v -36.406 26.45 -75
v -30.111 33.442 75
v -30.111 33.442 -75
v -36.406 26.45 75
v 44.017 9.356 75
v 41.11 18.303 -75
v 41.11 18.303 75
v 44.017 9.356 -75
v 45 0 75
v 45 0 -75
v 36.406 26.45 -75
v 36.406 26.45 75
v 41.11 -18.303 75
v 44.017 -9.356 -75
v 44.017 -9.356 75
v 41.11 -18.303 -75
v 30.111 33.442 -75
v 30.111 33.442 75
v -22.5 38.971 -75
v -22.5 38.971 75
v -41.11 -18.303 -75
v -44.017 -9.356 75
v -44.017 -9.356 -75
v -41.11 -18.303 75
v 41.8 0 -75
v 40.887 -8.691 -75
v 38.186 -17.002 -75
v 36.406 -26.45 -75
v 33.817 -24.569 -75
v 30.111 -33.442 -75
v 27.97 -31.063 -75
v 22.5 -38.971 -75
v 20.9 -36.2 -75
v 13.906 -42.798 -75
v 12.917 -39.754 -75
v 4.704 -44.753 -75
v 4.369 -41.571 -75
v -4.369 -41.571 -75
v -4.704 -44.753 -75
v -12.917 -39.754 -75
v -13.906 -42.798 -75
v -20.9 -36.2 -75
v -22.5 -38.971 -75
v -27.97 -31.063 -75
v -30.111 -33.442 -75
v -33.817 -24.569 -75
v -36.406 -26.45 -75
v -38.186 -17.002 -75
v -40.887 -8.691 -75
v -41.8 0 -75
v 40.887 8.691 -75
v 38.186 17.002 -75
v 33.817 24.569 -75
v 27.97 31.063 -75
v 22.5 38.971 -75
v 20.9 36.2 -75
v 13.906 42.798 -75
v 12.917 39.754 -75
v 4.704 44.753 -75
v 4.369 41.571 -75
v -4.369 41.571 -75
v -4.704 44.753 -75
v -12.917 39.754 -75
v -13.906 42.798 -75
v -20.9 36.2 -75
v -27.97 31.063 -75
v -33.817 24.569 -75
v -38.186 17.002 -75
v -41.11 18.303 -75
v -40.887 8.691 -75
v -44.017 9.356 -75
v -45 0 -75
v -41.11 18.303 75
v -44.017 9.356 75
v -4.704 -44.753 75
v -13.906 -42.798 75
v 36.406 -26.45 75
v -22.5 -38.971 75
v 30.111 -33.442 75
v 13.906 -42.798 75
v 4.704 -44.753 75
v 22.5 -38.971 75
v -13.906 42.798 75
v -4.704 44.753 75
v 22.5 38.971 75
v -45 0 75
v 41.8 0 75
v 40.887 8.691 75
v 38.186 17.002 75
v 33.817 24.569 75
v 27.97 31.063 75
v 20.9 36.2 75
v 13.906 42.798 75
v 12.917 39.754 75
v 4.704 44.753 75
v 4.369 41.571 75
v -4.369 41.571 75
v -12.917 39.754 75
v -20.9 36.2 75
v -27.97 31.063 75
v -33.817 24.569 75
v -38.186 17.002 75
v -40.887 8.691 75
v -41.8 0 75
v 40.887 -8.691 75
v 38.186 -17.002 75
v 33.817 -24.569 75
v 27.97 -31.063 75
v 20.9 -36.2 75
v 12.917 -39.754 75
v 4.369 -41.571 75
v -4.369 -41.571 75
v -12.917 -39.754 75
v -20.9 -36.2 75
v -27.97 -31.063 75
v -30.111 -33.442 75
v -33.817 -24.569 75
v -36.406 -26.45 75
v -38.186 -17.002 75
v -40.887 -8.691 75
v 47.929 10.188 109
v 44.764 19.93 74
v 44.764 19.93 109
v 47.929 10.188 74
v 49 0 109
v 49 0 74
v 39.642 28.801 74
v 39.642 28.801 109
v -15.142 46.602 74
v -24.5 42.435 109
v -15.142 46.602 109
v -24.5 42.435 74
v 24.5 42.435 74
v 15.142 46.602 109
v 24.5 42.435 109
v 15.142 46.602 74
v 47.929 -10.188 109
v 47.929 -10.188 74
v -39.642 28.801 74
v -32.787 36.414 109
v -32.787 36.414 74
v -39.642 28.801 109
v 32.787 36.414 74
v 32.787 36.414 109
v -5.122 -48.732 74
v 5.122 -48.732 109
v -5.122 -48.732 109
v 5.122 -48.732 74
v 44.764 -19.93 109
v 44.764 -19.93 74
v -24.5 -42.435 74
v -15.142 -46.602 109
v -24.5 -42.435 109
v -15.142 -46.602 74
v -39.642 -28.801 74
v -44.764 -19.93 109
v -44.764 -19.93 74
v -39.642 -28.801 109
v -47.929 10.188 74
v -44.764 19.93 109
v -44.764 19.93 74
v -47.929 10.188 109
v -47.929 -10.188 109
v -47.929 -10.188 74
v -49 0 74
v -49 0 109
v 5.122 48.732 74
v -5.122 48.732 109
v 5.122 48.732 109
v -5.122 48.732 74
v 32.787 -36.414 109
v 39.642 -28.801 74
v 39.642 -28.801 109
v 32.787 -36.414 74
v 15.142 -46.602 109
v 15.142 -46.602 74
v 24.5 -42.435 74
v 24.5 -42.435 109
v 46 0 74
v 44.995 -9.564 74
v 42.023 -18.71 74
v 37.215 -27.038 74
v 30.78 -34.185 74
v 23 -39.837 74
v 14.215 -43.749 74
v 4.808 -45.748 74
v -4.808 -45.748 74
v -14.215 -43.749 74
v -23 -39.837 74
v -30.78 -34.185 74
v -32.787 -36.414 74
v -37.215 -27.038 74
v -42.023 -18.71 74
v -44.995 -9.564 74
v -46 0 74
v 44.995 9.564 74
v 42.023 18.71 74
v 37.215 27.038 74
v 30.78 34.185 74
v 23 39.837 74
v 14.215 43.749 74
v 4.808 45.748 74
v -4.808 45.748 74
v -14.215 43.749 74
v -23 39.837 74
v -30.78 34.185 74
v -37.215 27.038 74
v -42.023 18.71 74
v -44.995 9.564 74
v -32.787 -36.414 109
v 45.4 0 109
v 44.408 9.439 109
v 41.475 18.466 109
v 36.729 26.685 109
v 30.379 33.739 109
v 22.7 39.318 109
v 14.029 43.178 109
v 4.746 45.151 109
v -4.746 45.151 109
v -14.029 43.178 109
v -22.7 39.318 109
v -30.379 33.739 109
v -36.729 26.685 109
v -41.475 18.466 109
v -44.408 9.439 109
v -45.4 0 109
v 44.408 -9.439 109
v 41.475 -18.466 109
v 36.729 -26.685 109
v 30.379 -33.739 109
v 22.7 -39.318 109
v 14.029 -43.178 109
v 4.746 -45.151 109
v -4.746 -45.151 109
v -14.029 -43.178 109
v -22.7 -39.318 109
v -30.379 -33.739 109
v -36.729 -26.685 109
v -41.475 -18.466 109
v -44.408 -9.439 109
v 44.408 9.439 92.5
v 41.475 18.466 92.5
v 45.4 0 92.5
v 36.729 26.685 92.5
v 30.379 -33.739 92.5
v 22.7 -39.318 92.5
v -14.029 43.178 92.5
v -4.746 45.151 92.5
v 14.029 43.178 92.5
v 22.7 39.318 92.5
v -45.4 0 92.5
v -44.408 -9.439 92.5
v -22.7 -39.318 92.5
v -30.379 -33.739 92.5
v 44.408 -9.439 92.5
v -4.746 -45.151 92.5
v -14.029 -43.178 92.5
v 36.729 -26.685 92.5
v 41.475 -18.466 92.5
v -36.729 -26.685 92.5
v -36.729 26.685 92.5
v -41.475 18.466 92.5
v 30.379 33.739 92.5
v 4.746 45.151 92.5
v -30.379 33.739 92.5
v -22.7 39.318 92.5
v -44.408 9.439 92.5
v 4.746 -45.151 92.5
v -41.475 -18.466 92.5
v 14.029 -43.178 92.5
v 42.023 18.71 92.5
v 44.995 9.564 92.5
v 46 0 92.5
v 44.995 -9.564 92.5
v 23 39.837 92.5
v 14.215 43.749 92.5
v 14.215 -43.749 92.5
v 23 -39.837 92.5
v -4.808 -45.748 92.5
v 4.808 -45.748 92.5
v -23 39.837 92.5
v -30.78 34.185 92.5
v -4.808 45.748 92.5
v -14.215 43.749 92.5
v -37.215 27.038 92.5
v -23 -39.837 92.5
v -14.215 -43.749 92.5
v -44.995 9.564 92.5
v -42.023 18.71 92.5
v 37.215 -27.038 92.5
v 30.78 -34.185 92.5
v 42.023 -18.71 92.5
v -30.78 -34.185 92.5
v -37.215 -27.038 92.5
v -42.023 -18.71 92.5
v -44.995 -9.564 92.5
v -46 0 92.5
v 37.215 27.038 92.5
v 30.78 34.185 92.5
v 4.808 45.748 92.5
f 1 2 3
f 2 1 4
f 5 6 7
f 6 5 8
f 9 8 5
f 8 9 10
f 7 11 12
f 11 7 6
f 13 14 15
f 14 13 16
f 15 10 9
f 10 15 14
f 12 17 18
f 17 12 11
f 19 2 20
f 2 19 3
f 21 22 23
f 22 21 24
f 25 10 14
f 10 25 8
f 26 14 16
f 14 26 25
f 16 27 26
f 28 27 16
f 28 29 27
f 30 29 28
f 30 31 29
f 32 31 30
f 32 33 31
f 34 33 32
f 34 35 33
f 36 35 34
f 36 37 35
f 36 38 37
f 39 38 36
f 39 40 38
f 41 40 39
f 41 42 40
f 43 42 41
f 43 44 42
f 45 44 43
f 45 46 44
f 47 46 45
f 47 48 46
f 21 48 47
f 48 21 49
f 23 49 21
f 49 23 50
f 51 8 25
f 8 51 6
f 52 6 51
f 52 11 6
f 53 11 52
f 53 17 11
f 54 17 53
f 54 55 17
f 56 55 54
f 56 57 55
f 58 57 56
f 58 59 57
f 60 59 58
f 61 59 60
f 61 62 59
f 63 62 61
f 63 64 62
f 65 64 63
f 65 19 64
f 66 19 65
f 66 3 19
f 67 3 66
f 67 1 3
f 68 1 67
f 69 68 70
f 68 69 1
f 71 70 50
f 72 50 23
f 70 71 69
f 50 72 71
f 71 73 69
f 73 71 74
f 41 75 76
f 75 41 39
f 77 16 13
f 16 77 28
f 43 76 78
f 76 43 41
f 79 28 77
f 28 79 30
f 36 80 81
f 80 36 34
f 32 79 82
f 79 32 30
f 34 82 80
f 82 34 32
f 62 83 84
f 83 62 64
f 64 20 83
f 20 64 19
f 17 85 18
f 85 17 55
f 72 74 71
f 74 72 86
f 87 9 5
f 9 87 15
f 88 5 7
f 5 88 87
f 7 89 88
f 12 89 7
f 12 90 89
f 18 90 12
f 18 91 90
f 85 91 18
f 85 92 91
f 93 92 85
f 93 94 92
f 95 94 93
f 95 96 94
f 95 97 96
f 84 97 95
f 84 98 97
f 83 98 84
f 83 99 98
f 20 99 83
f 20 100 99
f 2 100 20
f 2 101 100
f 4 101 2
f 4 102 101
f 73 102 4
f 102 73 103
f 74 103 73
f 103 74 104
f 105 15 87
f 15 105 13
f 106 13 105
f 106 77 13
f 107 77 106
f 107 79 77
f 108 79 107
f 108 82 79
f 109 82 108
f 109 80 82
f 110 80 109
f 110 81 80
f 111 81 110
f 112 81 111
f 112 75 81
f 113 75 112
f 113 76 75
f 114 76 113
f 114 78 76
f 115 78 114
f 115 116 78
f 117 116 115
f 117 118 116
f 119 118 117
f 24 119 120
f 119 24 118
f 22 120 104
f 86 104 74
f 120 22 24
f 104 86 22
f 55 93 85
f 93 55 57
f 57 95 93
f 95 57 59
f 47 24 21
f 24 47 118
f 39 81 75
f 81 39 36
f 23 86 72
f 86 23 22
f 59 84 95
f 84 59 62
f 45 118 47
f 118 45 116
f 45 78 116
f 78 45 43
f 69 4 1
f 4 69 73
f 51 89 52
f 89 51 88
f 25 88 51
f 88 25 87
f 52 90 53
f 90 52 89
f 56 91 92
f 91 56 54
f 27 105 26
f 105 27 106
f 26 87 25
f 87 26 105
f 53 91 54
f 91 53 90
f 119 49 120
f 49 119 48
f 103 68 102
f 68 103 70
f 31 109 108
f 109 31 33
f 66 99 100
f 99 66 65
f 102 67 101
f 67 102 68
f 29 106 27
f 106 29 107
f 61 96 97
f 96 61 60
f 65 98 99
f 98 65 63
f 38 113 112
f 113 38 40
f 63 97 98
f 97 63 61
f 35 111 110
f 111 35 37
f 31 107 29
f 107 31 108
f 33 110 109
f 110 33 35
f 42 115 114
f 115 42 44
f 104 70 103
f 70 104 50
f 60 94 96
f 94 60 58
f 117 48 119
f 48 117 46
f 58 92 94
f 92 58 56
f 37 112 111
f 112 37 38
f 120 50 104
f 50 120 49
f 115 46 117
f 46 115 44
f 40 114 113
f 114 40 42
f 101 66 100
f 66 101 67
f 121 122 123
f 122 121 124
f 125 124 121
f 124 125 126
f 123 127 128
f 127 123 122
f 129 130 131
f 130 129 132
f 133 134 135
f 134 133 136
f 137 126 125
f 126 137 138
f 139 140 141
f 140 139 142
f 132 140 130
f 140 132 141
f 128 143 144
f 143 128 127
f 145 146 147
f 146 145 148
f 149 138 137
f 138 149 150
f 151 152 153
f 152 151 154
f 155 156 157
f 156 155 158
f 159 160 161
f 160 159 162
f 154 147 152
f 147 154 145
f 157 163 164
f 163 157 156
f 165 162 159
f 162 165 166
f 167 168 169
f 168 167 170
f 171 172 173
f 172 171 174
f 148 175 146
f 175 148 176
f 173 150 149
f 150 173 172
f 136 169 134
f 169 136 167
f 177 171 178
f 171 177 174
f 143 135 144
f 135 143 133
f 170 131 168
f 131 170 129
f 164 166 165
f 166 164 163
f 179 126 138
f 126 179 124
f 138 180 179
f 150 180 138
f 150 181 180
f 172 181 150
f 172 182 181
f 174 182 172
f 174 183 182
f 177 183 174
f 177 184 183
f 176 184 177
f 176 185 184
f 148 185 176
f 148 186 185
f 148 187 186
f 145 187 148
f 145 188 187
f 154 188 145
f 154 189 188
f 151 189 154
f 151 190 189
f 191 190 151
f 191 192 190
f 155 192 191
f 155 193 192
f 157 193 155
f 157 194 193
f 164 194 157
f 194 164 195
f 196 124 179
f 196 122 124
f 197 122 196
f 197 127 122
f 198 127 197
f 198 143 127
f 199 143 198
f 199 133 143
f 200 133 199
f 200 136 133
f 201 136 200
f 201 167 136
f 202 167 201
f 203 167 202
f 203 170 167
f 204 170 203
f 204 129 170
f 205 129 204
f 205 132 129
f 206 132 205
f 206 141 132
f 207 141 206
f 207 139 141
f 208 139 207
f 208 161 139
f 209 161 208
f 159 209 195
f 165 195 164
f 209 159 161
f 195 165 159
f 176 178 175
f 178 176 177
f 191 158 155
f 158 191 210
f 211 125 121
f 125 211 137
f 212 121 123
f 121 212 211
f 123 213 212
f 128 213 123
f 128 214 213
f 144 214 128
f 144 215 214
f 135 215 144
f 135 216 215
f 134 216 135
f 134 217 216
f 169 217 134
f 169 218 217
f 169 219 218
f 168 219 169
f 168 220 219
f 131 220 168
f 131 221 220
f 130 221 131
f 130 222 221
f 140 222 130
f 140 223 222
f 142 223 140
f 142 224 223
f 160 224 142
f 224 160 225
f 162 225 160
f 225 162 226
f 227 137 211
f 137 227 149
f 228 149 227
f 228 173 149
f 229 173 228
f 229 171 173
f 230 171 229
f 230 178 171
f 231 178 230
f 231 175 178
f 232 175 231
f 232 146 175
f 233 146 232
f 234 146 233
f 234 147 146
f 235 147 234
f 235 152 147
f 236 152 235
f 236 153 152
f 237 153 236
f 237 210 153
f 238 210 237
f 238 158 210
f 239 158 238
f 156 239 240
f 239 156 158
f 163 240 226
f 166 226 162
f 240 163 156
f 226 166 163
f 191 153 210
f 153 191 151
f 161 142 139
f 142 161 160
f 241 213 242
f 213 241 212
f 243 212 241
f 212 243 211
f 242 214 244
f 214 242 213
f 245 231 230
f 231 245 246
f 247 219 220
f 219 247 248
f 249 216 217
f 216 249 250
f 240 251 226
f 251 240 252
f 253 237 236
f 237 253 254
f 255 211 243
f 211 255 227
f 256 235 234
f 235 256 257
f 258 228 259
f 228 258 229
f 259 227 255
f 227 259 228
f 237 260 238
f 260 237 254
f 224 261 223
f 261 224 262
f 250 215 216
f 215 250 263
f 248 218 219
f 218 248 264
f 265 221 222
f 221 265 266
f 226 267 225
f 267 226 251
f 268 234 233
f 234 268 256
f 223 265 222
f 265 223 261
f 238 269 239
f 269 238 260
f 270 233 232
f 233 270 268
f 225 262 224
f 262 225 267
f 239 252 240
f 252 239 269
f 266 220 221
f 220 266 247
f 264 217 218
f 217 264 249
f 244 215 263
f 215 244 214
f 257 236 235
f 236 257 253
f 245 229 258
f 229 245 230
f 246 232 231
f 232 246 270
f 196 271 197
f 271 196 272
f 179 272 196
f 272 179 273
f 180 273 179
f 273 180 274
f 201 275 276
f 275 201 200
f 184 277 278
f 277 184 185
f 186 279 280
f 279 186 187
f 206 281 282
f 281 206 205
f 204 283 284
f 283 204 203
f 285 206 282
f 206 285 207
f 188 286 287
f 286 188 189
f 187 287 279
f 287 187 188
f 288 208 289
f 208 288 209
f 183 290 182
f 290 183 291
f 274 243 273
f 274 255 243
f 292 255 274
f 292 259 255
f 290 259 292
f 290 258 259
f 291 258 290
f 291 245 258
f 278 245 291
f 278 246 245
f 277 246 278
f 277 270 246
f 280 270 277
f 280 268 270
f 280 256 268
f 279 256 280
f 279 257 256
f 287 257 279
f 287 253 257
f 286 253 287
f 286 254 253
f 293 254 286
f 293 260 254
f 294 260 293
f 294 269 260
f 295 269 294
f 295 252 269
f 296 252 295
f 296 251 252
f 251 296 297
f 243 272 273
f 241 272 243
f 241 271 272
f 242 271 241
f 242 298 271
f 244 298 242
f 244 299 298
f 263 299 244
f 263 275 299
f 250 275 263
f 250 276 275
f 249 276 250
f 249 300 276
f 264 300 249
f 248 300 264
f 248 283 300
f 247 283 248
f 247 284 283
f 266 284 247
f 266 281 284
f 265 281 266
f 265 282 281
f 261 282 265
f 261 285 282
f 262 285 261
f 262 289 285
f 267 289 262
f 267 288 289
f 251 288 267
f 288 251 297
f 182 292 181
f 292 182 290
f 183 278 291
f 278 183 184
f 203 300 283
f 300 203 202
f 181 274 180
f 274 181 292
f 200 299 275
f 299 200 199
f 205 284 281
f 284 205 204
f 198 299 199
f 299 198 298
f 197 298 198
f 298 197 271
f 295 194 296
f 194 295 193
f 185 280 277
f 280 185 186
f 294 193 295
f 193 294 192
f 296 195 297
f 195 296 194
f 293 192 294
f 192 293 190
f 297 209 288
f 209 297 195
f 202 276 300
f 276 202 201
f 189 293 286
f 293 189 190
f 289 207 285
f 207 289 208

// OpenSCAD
// Parameters
length_mm = 150; //[75:300:1]
outer_diameter_mm = 90; //[45:180:1]
wall_thickness_mm = 3.2; //[1.6:6.4:0.1]
include_fitting = 1; //[0:1:1]
fitting_end = 1; //[0:1:1]
fitting_length_mm = 35; //[18:70:1]
fitting_outer_diameter_mm = 98; //[90:120:1]
fitting_wall_thickness_mm = 3.6; //[1.8:7.2:0.1]
fitting_socket_depth_mm = 25; //[12:50:1]
fitting_stop_thickness_mm = 2; //[1:5:0.5]
overlap_mm = 1; //[0.5:2:0.1]

// HT Pipe - complete geometry
module ht_pipe() {
  color([0.85, 0.85, 0.8]) {
    // Pipe body
    difference() {
      cylinder(h=length_mm, r=outer_diameter_mm/2, center=true);
      translate([0, 0, 0])
        cylinder(h=length_mm + 2*overlap_mm, r=outer_diameter_mm/2 - wall_thickness_mm, center=true);
    }
    
    if (include_fitting) {
      // Fitting
      difference() {
        translate([0, 0, fitting_end ? length_mm/2 + fitting_length_mm/2 - overlap_mm : -(length_mm/2 + fitting_length_mm/2 - overlap_mm)])
          cylinder(h=fitting_length_mm, r=fitting_outer_diameter_mm/2, center=true);
        
        translate([0, 0, fitting_end ? length_mm/2 + fitting_length_mm/2 - overlap_mm : -(length_mm/2 + fitting_length_mm/2 - overlap_mm)])
          cylinder(h=fitting_length_mm + 2*overlap_mm, r=fitting_outer_diameter_mm/2 - fitting_wall_thickness_mm, center=true);
        
        translate([0, 0, fitting_end ? length_mm/2 + fitting_length_mm/2 - fitting_socket_depth_mm/2 : -(length_mm/2 + fitting_length_mm/2 - fitting_socket_depth_mm/2)])
          cylinder(h=fitting_socket_depth_mm, r=outer_diameter_mm/2 + overlap_mm, center=true);
        
        translate([0, 0, fitting_end ? length_mm/2 + fitting_length_mm/2 - fitting_socket_depth_mm + fitting_stop_thickness_mm/2 : -(length_mm/2 + fitting_length_mm/2 - fitting_socket_depth_mm + fitting_stop_thickness_mm/2)])
          cylinder(h=fitting_stop_thickness_mm + 2*overlap_mm, r=outer_diameter_mm/2 - wall_thickness_mm, center=true);
      }
    }
  }
}

// Assembly
module assembly() {
  ht_pipe();
}

assembly();
